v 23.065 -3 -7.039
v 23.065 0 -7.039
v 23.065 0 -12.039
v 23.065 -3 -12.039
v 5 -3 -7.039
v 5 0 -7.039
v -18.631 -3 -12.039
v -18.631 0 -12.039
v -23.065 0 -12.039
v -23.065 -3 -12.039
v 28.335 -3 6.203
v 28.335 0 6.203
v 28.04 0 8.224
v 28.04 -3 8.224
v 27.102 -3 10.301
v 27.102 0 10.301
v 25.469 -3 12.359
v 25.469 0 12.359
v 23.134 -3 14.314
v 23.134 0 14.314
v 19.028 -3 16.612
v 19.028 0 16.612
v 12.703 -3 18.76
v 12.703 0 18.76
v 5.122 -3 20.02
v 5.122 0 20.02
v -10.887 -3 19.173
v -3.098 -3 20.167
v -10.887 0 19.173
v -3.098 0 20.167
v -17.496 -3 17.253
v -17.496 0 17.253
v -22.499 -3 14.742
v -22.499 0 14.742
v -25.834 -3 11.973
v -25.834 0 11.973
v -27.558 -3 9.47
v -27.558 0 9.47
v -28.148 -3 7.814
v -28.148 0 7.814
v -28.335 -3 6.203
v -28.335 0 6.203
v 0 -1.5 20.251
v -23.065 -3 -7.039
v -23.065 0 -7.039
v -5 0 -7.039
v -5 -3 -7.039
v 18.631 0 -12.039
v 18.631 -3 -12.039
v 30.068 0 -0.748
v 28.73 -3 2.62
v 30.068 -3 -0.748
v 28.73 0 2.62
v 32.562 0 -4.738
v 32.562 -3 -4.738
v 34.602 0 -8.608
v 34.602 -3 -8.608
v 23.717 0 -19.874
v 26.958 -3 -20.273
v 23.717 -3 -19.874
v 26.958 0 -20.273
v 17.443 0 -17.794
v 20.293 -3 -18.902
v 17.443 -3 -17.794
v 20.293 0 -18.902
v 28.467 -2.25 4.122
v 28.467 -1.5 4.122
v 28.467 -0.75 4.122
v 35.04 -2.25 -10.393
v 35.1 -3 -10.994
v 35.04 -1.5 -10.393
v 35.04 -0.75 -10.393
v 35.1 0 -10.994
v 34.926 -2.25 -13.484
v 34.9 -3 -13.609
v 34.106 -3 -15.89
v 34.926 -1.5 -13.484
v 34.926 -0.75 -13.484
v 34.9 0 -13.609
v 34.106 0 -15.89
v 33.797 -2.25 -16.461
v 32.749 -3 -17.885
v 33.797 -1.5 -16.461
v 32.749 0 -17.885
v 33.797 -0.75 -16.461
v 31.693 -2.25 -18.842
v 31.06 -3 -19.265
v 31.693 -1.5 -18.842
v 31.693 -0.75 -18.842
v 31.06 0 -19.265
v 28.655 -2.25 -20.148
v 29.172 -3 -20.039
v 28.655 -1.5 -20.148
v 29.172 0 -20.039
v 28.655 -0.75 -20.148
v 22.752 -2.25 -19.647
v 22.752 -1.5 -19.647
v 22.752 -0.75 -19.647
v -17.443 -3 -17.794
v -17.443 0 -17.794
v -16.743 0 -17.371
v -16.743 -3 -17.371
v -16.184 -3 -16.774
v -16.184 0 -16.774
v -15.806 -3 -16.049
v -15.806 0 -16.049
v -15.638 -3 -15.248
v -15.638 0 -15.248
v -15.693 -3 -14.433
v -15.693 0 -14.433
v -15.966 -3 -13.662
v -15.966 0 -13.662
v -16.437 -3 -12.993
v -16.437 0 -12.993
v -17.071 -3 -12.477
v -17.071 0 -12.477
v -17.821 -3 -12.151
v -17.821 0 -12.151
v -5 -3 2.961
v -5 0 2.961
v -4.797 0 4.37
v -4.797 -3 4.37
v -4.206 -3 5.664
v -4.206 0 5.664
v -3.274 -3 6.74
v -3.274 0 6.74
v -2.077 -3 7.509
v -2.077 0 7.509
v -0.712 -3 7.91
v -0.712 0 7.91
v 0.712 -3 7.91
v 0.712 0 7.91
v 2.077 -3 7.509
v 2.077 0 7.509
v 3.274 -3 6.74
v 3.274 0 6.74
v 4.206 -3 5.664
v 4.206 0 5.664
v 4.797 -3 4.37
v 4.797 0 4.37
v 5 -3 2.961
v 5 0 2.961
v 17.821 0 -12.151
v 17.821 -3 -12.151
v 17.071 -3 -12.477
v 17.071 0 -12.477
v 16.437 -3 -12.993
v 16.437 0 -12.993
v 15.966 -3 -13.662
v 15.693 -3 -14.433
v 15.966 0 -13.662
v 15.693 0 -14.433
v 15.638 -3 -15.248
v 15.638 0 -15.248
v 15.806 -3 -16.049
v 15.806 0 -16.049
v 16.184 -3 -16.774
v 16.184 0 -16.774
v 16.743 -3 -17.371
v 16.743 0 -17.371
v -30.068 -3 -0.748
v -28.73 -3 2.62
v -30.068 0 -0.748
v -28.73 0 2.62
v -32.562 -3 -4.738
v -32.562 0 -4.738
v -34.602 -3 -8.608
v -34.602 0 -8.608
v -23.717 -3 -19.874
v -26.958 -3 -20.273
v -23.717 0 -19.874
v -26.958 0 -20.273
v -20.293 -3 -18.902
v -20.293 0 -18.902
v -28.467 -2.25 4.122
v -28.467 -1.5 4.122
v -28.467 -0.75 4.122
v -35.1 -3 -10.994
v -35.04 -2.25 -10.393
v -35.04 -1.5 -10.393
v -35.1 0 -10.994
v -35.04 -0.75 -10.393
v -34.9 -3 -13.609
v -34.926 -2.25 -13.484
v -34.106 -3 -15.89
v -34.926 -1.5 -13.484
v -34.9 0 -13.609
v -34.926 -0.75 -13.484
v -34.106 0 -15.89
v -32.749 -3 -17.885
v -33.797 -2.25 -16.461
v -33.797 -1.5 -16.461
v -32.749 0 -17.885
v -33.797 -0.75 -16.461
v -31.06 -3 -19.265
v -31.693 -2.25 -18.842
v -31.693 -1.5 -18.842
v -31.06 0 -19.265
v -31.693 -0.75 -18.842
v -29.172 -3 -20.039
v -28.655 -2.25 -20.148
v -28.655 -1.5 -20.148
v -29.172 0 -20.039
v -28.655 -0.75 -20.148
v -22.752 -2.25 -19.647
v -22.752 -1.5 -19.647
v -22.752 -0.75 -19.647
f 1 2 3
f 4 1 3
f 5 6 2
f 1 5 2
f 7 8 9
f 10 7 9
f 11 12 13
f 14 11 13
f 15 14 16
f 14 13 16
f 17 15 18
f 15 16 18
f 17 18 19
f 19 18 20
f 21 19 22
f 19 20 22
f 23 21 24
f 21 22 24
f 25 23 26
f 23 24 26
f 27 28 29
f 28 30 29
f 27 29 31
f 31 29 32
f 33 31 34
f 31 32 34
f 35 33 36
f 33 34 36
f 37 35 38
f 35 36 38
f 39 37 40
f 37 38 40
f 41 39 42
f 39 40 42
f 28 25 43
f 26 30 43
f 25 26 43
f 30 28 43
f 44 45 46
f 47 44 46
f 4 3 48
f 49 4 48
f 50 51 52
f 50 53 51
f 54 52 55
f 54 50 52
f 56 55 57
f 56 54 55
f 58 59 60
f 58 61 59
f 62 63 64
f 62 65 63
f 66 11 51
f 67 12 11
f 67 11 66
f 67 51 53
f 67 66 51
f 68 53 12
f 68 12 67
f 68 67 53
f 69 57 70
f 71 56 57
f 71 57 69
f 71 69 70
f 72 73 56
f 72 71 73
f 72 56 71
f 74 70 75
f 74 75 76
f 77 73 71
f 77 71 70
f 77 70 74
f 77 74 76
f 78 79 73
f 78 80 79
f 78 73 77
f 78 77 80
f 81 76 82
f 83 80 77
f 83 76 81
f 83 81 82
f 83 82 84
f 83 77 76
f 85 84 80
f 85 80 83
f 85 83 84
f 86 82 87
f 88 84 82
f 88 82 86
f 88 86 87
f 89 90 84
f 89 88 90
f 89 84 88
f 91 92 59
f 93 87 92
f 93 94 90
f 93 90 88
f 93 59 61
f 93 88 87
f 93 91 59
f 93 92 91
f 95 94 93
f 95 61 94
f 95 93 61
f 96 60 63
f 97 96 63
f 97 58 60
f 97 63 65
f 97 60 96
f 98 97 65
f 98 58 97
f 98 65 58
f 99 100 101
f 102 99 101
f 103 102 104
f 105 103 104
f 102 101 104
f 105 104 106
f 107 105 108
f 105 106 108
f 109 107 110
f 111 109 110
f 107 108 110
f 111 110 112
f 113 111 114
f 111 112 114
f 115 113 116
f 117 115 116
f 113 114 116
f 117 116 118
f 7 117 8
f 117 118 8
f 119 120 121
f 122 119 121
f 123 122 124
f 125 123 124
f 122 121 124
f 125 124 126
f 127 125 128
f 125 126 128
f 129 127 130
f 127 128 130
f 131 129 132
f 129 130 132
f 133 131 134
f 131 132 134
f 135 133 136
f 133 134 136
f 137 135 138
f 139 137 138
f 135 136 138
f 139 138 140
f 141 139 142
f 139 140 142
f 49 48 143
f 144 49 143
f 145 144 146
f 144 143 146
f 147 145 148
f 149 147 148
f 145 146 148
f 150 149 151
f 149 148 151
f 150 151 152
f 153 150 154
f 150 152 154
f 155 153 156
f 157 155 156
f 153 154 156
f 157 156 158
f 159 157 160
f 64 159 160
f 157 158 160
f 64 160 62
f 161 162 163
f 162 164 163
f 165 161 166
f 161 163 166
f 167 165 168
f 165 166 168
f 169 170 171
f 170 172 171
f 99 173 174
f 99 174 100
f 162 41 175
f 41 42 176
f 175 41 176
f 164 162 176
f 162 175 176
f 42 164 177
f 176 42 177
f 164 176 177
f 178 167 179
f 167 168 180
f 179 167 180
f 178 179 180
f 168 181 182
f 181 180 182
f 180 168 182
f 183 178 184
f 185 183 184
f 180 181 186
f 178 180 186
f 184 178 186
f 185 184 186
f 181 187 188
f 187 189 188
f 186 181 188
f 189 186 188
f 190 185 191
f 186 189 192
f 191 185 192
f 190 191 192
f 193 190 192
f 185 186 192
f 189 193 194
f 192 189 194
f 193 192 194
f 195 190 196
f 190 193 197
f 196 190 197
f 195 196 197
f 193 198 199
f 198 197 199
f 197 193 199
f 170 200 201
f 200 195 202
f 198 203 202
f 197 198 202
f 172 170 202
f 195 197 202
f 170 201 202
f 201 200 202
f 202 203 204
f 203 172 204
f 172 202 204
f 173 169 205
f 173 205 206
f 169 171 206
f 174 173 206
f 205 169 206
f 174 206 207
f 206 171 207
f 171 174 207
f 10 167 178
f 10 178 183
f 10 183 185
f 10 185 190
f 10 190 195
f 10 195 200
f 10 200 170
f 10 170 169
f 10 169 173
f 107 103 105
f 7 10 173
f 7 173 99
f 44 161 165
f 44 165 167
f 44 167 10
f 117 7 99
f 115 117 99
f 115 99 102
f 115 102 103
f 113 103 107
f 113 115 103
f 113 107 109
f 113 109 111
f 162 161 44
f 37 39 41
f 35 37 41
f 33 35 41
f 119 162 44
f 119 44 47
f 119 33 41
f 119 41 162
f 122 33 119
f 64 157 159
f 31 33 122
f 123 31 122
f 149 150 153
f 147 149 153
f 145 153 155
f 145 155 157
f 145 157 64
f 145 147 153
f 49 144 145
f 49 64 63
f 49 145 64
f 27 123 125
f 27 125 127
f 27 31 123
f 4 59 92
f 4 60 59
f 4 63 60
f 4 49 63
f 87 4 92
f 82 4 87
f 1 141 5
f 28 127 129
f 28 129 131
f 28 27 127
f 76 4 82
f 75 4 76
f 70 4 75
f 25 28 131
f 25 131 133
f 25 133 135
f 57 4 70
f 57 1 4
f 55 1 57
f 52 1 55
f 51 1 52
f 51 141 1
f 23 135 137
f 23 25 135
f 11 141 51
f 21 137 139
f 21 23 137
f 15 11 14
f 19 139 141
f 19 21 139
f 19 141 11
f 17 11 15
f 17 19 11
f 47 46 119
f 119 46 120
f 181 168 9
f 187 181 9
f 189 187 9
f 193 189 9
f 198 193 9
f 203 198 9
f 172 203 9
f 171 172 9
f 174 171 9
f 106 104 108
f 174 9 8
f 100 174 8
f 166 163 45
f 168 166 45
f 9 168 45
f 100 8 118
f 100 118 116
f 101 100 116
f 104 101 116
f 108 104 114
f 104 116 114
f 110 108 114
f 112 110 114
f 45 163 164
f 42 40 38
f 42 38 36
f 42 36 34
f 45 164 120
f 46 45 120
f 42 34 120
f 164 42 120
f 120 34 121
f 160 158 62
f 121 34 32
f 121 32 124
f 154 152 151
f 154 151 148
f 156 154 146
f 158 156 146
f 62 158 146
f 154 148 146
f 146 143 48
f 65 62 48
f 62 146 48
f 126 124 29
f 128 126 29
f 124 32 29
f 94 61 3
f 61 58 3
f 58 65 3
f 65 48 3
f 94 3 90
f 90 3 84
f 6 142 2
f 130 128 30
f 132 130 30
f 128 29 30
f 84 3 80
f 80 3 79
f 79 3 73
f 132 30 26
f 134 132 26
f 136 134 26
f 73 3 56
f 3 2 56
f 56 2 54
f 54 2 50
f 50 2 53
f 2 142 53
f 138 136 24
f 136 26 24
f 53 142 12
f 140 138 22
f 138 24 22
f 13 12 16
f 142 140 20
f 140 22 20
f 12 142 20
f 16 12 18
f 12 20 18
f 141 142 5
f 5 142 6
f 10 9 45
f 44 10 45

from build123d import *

# Parameters (mm, degrees)
F1_DEPTH = 3


# Not quite as in the source:
# - ends of sketch curves that miss each other by under 0.0002 mm in the source are joined
# - the dataset's text gives a spline's control points without its knots; the knots are read off the source's solid


with BuildPart() as f1:
    # F0 (on Front) → F1 (new body)
    with BuildSketch(Plane.XZ):
        with BuildLine():
            Line((-18.631138, -12.039077), (-23.065, -12.039077))
            Line((-23.065, -12.039077), (-23.065, -7.039077))
            Line((-23.065, -7.039077), (-5, -7.039077))
            Line((-5, -7.039077), (-5, 2.960923))
            ThreePointArc((-5, 2.960923), (0, 7.960923), (5, 2.960923))
            Line((5, 2.960923), (5, -7.039077))
            Line((5, -7.039077), (23.065, -7.039077))
            Line((23.065, -7.039077), (23.065, -12.039077))
            Line((23.065, -12.039077), (18.631137, -12.039077))
            ThreePointArc((18.631137, -12.039077), (15.6930952866, -14.4325204153), (17.4430779685, -17.7938030731))
            add(Edge.make_bspline(
                [(28.334969, 6.202538), (28.382769, 5.719314), (28.407006, -1.378841), (38.47544, -8.061034), (31.583633, -23.110185), (20.19345, -18.979985), (17.4430779685, -17.7938030731)],
                knots=[26.688985, 26.688985, 26.688985, 26.688985, 28.557776, 42.872008, 54.1154, 62.665306, 62.665306, 62.665306, 62.665306], degree=3))
            add(Edge.make_bspline(
                [(28.334969, 6.202538), (28.334969, 20.2509254333), (-4.9078e-06, 20.250923), (-28.3349788155, 20.2509205667), (-28.334969, 6.2025331335)],
                knots=[0, 0, 0, 1.5707965, 1.5707965, 3.141593, 3.141593, 3.141593], degree=2, weights=[1, 0.7071067199, 1, 0.7071067199, 1]))
            add(Edge.make_bspline(
                [(-28.334969, 6.2025331335), (-28.382769, 5.719314), (-28.407006, -1.378841), (-38.47544, -8.061034), (-31.583633, -23.110185), (-20.193451, -18.979985), (-17.443078, -17.793803)],
                knots=[26.688985, 26.688985, 26.688985, 26.688985, 28.557776, 42.872008, 54.1154, 62.665306, 62.665306, 62.665306, 62.665306], degree=3))
            ThreePointArc((-17.443078, -17.793803), (-15.6930963794, -14.4325199657), (-18.631138, -12.039077))
        make_face()
    extrude(amount=F1_DEPTH)


solid = f1.part
